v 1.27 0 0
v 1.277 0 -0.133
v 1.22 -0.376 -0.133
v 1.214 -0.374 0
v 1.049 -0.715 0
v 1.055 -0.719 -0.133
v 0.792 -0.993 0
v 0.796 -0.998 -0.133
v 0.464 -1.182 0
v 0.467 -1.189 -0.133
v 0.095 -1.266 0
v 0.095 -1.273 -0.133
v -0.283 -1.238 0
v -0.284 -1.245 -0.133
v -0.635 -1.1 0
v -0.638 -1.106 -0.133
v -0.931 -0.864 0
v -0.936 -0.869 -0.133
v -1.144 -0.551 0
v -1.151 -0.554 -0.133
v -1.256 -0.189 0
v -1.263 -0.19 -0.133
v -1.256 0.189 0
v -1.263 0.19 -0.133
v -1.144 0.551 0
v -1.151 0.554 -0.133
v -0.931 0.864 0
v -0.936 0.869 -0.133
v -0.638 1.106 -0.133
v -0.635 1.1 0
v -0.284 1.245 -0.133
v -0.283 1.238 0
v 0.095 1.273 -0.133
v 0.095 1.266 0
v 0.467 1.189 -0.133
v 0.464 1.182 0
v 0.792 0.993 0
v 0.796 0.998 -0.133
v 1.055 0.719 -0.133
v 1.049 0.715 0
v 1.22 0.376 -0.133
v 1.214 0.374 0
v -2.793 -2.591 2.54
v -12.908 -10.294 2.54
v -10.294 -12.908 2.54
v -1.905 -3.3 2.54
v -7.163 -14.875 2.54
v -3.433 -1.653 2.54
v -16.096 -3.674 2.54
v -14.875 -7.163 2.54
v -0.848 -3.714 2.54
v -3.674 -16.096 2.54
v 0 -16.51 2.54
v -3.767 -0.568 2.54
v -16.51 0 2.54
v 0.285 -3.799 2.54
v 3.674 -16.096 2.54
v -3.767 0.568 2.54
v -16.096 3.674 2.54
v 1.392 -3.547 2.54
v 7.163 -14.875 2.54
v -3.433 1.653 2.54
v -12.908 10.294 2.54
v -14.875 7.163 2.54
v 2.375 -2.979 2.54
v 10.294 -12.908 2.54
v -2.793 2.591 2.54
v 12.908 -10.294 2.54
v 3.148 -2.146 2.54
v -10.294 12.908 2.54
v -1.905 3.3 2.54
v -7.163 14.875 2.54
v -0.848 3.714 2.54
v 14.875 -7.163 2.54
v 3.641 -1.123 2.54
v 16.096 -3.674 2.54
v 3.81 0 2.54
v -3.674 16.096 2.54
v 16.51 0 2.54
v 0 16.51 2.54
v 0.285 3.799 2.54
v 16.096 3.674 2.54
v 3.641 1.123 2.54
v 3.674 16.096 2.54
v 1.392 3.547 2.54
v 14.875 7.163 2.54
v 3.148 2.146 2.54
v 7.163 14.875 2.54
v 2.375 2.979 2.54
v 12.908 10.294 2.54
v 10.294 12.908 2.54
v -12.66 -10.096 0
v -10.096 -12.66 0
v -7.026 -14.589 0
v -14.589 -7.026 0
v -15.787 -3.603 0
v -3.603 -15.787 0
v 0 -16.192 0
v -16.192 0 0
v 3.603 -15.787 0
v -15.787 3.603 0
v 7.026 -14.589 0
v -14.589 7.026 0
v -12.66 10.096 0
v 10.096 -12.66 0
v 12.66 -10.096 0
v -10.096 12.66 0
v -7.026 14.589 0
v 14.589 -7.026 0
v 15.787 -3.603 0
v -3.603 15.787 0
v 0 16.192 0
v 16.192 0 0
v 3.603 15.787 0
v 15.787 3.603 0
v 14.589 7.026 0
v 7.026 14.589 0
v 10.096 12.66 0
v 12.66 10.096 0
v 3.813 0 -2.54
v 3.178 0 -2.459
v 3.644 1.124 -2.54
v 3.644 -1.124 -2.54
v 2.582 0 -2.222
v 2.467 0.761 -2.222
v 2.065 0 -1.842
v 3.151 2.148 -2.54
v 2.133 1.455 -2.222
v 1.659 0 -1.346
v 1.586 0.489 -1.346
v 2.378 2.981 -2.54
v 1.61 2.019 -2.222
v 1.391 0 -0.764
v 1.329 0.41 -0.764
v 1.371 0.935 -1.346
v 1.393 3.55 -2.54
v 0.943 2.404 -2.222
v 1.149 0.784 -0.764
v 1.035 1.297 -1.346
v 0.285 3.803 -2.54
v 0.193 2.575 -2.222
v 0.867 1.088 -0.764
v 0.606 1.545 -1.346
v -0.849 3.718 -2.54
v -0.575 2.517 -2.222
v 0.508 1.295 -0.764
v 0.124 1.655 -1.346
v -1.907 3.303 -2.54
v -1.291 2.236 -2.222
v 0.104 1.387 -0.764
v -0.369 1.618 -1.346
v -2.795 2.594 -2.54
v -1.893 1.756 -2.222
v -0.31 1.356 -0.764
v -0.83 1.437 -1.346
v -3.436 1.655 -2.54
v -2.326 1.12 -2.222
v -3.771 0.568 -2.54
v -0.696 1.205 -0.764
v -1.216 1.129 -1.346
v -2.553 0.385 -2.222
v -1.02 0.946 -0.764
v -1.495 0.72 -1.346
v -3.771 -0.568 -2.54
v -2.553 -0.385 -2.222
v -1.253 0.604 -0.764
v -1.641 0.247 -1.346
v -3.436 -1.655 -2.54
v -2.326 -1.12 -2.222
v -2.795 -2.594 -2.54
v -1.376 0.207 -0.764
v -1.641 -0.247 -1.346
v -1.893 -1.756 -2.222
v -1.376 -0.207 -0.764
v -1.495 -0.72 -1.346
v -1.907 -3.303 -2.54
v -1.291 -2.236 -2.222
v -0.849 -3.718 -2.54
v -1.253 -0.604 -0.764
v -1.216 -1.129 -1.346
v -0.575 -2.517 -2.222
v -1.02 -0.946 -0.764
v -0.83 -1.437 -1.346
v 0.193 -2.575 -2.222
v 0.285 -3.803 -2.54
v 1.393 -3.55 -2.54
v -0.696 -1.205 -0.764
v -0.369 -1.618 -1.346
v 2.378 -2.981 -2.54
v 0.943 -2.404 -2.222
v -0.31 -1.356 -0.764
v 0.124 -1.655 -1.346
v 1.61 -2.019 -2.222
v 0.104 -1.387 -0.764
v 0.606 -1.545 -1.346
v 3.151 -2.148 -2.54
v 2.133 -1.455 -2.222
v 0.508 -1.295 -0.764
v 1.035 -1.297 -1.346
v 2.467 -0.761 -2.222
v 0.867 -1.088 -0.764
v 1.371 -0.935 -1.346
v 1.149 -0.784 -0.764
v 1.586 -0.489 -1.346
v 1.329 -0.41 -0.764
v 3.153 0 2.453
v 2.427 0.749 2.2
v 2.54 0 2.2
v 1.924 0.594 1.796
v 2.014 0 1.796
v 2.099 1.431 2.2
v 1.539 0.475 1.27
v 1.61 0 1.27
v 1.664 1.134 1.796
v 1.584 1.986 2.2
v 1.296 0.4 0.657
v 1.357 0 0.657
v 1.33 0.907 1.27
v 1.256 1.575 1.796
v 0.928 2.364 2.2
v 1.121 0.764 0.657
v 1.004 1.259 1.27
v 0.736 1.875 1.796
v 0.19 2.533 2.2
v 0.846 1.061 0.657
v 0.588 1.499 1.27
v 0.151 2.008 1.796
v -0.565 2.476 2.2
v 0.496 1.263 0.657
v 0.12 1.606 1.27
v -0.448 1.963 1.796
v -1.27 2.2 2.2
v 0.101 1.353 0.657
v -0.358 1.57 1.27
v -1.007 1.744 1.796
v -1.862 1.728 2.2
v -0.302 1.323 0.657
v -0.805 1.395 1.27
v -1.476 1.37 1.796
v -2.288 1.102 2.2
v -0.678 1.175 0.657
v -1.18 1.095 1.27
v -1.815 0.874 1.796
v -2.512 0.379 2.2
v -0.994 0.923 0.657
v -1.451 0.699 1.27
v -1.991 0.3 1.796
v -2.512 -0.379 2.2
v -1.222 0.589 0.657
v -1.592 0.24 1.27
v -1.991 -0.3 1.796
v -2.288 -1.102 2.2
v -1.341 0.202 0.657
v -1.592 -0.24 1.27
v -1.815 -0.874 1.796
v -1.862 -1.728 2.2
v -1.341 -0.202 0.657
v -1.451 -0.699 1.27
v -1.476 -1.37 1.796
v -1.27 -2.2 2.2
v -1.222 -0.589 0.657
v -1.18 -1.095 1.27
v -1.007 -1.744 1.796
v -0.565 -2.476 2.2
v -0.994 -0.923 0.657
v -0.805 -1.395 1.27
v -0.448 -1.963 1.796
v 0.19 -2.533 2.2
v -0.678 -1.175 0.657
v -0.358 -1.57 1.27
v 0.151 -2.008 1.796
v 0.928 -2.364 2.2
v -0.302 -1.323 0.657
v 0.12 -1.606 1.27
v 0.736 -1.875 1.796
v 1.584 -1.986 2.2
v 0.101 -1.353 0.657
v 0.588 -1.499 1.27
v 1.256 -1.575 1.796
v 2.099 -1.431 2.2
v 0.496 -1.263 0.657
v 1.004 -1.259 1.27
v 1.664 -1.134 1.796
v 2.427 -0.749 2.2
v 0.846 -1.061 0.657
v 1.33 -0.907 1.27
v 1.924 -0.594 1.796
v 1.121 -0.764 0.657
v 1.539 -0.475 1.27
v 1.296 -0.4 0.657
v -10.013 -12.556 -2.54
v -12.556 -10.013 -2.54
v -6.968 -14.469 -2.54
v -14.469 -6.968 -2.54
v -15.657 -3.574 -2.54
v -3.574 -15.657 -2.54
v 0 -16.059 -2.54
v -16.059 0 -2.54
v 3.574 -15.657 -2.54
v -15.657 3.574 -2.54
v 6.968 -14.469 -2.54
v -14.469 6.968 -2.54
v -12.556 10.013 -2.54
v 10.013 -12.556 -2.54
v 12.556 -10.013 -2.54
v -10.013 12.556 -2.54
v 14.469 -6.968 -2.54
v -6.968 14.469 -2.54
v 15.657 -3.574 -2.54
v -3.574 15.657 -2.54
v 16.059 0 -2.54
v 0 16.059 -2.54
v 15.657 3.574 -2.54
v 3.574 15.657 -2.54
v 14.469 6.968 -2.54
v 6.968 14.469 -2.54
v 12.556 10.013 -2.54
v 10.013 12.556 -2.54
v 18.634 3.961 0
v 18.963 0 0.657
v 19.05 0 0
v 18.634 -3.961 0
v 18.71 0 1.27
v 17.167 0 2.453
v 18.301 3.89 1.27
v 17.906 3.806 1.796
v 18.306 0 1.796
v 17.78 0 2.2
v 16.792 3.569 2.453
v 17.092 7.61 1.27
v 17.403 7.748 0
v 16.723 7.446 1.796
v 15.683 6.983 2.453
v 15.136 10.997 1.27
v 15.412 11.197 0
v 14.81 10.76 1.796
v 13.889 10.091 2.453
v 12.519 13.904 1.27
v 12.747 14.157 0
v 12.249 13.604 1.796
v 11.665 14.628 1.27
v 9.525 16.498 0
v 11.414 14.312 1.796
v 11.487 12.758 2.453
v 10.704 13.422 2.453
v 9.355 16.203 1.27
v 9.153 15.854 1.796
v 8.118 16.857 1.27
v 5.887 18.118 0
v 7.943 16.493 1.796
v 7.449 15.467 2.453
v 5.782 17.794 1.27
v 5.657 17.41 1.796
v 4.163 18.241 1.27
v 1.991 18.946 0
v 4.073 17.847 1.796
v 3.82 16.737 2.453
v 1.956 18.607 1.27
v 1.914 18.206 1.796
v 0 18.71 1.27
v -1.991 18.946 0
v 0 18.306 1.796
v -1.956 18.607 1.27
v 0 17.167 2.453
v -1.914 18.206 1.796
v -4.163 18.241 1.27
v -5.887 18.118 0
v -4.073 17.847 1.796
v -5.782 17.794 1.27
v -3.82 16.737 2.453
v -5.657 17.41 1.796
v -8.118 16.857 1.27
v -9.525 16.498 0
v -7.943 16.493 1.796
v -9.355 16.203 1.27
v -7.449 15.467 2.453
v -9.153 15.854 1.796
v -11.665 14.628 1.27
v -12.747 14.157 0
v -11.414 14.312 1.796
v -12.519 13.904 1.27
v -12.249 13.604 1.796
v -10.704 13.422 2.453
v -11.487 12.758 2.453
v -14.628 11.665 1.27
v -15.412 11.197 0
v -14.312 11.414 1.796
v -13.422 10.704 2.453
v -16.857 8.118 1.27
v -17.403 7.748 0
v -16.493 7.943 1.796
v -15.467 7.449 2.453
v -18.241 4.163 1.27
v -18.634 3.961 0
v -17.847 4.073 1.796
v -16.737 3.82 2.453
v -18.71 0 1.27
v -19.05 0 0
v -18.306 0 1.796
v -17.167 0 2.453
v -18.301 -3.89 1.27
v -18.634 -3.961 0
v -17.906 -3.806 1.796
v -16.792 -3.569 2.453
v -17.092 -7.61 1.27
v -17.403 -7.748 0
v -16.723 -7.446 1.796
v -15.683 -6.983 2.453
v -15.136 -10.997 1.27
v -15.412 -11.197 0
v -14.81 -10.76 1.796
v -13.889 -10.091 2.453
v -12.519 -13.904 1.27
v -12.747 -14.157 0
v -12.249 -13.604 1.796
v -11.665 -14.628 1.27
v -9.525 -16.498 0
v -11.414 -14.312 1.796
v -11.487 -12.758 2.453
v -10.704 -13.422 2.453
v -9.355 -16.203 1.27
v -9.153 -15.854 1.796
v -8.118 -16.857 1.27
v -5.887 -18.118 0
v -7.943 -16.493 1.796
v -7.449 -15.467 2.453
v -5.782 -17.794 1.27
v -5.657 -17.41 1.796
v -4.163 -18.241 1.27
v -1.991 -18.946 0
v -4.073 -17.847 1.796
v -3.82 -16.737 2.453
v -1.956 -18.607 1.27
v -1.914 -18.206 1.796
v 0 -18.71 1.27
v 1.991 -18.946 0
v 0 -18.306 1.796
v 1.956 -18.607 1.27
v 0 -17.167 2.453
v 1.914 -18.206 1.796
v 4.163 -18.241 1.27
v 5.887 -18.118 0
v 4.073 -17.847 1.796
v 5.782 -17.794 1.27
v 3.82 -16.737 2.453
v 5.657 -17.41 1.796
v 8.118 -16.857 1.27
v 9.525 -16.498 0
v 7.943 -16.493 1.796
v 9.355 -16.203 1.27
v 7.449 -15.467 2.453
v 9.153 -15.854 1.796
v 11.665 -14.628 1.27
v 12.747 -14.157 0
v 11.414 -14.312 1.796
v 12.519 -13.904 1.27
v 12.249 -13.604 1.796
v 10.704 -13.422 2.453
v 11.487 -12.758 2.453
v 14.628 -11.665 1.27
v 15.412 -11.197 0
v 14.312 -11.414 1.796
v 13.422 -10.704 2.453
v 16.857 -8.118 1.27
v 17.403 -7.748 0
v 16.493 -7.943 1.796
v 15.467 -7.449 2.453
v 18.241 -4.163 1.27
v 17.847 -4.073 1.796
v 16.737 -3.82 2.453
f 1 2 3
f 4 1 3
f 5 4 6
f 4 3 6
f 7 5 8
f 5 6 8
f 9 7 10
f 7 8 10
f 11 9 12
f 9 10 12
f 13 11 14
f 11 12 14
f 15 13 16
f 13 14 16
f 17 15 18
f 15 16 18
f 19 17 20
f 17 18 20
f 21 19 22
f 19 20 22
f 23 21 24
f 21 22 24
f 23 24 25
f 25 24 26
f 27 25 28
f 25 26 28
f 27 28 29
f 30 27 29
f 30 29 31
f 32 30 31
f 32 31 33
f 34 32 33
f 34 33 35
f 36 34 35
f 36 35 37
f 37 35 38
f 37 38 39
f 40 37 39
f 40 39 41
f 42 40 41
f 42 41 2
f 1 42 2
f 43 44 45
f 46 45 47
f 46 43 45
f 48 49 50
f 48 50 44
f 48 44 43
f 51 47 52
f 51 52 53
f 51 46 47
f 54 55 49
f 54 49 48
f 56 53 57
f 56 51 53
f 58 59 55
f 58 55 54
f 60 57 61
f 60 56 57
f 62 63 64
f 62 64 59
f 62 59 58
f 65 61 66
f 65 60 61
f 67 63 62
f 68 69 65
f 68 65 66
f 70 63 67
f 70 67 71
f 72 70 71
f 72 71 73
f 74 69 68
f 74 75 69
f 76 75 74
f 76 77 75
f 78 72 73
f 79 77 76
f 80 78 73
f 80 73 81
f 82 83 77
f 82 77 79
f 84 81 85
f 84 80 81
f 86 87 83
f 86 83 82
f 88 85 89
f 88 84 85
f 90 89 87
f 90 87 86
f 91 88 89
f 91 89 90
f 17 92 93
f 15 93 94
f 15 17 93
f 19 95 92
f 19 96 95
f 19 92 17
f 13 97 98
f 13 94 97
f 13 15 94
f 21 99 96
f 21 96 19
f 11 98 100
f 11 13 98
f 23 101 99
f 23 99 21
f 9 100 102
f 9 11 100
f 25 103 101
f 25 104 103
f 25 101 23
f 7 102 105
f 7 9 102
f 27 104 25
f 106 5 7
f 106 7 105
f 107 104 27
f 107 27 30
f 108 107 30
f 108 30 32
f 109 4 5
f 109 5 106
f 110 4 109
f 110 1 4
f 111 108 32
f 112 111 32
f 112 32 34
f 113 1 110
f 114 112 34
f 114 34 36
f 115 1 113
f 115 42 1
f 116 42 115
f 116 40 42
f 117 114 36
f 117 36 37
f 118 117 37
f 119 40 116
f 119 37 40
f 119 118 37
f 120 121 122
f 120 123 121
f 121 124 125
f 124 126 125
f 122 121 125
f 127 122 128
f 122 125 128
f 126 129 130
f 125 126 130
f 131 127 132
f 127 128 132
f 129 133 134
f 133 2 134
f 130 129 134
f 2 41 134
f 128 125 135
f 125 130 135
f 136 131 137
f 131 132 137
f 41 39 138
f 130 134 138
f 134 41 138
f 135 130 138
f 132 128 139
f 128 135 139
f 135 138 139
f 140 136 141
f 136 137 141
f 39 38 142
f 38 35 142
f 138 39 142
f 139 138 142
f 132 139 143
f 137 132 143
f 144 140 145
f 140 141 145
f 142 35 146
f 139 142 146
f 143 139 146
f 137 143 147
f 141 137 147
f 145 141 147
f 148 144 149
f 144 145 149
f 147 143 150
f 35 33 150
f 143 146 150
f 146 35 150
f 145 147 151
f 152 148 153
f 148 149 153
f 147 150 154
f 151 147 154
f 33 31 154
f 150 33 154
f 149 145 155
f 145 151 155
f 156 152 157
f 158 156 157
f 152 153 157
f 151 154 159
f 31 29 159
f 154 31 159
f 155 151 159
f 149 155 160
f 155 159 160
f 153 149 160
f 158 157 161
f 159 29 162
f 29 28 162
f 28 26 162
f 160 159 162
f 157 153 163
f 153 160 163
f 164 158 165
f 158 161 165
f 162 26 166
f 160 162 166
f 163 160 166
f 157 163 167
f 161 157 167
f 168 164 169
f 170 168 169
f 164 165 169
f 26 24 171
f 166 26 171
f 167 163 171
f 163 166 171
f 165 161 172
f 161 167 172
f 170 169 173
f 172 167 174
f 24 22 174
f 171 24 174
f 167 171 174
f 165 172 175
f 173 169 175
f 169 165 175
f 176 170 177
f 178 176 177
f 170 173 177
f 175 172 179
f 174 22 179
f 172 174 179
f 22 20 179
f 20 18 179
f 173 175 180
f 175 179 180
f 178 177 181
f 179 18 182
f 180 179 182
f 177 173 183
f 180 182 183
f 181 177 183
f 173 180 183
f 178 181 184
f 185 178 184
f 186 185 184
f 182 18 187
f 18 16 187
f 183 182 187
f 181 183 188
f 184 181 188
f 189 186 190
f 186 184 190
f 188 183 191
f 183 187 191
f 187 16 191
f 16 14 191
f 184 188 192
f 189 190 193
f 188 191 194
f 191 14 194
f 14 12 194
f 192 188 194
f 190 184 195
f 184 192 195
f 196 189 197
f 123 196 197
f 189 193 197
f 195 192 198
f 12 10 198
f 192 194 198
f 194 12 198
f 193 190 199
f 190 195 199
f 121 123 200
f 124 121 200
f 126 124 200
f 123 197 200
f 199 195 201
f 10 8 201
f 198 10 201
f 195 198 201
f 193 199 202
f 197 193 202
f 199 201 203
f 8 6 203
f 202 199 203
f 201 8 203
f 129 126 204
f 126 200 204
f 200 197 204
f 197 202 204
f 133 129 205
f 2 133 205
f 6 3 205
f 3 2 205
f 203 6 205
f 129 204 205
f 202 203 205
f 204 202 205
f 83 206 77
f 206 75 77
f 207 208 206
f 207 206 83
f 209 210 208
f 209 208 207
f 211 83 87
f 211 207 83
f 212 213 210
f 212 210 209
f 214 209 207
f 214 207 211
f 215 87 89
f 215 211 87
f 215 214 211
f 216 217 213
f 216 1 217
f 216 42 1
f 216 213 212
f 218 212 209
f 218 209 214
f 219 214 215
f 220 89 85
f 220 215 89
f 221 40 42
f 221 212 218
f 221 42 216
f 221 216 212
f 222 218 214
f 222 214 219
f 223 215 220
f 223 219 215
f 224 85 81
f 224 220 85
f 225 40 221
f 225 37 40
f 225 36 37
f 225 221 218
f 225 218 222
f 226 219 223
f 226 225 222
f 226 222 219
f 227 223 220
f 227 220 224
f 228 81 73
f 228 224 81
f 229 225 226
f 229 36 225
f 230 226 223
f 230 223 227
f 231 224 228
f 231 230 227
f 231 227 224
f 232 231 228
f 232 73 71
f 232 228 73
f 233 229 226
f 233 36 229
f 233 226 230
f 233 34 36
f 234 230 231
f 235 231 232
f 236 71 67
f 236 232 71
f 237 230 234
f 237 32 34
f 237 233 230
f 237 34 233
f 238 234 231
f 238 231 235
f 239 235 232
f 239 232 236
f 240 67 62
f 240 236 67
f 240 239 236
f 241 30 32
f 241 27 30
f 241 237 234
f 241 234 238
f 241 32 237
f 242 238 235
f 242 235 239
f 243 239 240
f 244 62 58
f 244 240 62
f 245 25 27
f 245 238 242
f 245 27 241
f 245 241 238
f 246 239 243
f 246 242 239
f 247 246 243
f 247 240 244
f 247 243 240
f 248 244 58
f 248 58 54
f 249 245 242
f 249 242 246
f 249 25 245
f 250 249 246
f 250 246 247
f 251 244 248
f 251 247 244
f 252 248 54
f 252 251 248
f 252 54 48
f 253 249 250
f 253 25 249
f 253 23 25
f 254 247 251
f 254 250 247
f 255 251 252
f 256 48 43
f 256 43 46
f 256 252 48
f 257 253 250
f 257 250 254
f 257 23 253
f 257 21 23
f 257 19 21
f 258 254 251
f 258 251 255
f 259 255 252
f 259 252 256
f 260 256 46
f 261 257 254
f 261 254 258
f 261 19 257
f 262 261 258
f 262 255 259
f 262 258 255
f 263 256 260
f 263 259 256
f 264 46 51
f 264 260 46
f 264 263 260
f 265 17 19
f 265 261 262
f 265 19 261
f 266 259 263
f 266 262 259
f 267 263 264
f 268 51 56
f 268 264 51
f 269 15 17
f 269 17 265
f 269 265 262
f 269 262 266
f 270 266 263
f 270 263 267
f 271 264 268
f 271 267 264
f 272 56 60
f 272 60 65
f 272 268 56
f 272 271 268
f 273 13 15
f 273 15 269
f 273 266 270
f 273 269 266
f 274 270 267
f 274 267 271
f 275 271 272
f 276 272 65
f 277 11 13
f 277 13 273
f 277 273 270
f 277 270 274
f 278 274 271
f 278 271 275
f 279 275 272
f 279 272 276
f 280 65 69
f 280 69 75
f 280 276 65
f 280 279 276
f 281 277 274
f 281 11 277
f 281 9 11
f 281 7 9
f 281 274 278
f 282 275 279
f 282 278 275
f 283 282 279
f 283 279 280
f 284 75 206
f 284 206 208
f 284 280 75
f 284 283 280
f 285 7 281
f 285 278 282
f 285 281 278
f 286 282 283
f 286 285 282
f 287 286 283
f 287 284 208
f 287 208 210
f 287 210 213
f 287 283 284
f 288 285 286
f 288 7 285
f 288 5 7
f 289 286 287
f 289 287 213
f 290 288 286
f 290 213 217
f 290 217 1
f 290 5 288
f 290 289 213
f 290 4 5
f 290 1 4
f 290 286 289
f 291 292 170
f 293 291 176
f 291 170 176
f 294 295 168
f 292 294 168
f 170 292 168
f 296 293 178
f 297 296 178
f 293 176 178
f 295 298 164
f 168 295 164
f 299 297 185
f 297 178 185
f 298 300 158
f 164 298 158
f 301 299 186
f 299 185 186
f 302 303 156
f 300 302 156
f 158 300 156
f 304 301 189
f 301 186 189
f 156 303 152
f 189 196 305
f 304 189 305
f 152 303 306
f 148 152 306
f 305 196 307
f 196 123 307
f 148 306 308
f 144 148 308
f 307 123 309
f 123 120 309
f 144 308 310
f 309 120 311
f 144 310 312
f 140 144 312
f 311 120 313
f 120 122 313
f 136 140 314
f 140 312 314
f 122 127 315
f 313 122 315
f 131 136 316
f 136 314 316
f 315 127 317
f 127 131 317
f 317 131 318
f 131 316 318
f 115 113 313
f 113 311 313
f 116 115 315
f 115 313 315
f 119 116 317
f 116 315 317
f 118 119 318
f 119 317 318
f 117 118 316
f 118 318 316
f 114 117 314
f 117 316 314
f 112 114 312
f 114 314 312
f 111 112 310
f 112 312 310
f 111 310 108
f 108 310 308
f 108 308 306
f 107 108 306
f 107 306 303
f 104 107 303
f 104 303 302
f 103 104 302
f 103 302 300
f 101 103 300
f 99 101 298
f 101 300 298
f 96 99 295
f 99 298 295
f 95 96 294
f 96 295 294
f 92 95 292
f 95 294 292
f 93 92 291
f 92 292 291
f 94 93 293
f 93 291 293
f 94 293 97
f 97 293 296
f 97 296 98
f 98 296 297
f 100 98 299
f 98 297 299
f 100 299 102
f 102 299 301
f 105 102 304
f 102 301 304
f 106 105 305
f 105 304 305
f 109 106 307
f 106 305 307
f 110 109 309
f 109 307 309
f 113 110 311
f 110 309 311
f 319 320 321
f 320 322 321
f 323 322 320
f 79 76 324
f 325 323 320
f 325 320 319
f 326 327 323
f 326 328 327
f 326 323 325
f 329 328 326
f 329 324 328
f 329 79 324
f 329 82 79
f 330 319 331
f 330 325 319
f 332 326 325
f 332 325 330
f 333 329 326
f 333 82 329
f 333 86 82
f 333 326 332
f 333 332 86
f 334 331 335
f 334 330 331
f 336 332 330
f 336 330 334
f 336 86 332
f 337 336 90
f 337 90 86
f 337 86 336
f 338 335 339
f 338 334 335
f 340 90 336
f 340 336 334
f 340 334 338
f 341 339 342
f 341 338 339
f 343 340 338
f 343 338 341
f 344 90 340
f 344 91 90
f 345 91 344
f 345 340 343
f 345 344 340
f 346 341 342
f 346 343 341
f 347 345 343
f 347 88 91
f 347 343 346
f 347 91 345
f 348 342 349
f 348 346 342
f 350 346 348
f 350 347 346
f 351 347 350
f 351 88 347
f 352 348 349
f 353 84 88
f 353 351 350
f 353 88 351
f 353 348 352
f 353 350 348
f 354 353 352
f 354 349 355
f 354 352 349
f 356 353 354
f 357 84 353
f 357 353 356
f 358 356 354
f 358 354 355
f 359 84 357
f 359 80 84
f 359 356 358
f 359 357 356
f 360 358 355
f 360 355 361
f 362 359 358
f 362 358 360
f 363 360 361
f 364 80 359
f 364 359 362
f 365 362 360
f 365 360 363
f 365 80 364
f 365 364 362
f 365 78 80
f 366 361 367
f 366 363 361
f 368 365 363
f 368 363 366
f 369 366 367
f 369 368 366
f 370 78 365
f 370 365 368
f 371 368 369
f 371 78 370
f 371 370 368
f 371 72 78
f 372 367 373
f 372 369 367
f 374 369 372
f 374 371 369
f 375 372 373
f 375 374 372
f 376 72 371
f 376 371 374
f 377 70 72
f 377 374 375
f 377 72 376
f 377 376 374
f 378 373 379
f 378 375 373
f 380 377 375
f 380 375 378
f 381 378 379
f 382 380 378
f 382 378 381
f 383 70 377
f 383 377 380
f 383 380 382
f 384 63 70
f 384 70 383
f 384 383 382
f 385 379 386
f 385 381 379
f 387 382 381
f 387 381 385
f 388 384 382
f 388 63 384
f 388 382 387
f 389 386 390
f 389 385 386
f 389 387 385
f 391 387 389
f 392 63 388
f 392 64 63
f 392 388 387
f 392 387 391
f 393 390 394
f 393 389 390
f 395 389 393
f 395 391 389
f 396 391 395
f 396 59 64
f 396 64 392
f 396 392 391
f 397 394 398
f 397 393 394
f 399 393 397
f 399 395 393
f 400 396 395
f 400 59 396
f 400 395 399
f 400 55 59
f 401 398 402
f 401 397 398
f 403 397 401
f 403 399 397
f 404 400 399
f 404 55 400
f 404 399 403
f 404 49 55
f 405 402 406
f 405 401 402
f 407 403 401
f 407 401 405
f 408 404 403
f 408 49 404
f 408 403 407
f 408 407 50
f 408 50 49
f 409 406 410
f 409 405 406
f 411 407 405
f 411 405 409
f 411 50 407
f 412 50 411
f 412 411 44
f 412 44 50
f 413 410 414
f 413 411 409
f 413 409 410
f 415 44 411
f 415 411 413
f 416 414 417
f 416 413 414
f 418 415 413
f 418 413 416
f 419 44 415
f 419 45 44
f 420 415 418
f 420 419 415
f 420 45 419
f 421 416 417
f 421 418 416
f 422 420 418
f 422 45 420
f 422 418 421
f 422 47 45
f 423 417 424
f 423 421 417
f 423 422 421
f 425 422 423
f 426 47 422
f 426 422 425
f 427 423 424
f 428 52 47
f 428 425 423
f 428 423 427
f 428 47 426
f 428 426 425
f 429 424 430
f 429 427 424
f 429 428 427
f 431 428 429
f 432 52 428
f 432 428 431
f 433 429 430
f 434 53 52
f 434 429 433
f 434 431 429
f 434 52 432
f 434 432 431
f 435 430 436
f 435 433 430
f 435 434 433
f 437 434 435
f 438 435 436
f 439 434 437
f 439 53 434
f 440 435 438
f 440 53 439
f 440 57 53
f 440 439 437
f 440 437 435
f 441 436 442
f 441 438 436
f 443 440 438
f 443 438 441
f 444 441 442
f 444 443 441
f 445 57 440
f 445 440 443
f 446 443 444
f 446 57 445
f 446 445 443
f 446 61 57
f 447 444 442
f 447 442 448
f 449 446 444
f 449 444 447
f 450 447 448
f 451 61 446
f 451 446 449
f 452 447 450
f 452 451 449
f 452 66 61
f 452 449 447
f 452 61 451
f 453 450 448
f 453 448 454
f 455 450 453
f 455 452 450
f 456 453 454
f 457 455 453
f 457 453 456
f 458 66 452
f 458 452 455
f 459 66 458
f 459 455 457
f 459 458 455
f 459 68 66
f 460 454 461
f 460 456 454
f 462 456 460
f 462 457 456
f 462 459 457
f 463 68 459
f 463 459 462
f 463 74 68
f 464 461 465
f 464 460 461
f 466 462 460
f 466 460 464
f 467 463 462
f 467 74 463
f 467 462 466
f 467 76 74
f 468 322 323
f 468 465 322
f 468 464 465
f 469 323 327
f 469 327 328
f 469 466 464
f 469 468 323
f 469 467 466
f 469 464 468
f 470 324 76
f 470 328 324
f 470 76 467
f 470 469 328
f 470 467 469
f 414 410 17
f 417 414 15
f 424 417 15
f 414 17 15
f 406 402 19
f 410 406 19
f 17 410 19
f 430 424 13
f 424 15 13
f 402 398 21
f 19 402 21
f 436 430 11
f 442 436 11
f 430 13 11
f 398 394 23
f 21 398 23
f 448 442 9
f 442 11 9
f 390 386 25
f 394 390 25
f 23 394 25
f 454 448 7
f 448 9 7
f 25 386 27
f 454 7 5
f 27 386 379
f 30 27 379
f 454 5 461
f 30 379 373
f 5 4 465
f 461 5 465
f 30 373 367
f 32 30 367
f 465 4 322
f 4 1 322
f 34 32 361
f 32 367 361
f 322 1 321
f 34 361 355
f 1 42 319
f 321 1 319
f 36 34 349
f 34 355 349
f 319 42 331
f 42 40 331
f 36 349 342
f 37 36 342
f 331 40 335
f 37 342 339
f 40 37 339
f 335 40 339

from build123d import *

# Parameters (mm, degrees)
F0_R     = 19.05
F0_R_2   = 16.1925
F0_R_3   = 1.27
F1_DEPTH = 2.54
F2_DEPTH = 2.54
F2_TAPER = 3
F3_R     = 2.53999
F4_R     = 2.53999
F4_2_R   = 2.53999


# Not quite as in the source:
# - a fillet or chamfer is up to 0.001 mm smaller than in the source, because OpenCascade refuses the exact size


with BuildPart() as f1:
    # F0 (on Top) → F1 (new body)
    with BuildSketch(Plane.XY):
        Circle(F0_R)
        Circle(F0_R_2, mode=Mode.SUBTRACT)
        Circle(F0_R_2)
        Circle(F0_R_3, mode=Mode.SUBTRACT)
    extrude(amount=F1_DEPTH)

    # F3 (radius 2.54 in the source; OpenCascade refuses exactly that, so slightly less here)
    f3_edges = [f1.edges().sort_by_distance(p)[0] for p in [
        (-19.05, 0, 2.54),
    ]]
    fillet(f3_edges, radius=F3_R)

    # F4 (radius 2.54 in the source; OpenCascade refuses exactly that, so slightly less here)
    f4_edges = [f1.edges().sort_by_distance(p)[0] for p in [
        (-1.27, 0, 2.54),
    ]]
    fillet(f4_edges, radius=F4_R)


with BuildPart() as f2:
    # F0 (on Top) → F2 (new body)
    with BuildSketch(Plane.XY):
        Circle(F0_R_2)
        Circle(F0_R_3, mode=Mode.SUBTRACT)
    extrude(amount=-F2_DEPTH, taper=F2_TAPER)

    # F4#2 (radius 2.54 in the source; OpenCascade refuses exactly that, so slightly less here)
    f4_2_edges = [f2.edges().sort_by_distance(p)[0] for p in [
        (-1.403116, 0, -2.54),
    ]]
    fillet(f4_2_edges, radius=F4_2_R)


solid = Compound([f1.part, f2.part])
